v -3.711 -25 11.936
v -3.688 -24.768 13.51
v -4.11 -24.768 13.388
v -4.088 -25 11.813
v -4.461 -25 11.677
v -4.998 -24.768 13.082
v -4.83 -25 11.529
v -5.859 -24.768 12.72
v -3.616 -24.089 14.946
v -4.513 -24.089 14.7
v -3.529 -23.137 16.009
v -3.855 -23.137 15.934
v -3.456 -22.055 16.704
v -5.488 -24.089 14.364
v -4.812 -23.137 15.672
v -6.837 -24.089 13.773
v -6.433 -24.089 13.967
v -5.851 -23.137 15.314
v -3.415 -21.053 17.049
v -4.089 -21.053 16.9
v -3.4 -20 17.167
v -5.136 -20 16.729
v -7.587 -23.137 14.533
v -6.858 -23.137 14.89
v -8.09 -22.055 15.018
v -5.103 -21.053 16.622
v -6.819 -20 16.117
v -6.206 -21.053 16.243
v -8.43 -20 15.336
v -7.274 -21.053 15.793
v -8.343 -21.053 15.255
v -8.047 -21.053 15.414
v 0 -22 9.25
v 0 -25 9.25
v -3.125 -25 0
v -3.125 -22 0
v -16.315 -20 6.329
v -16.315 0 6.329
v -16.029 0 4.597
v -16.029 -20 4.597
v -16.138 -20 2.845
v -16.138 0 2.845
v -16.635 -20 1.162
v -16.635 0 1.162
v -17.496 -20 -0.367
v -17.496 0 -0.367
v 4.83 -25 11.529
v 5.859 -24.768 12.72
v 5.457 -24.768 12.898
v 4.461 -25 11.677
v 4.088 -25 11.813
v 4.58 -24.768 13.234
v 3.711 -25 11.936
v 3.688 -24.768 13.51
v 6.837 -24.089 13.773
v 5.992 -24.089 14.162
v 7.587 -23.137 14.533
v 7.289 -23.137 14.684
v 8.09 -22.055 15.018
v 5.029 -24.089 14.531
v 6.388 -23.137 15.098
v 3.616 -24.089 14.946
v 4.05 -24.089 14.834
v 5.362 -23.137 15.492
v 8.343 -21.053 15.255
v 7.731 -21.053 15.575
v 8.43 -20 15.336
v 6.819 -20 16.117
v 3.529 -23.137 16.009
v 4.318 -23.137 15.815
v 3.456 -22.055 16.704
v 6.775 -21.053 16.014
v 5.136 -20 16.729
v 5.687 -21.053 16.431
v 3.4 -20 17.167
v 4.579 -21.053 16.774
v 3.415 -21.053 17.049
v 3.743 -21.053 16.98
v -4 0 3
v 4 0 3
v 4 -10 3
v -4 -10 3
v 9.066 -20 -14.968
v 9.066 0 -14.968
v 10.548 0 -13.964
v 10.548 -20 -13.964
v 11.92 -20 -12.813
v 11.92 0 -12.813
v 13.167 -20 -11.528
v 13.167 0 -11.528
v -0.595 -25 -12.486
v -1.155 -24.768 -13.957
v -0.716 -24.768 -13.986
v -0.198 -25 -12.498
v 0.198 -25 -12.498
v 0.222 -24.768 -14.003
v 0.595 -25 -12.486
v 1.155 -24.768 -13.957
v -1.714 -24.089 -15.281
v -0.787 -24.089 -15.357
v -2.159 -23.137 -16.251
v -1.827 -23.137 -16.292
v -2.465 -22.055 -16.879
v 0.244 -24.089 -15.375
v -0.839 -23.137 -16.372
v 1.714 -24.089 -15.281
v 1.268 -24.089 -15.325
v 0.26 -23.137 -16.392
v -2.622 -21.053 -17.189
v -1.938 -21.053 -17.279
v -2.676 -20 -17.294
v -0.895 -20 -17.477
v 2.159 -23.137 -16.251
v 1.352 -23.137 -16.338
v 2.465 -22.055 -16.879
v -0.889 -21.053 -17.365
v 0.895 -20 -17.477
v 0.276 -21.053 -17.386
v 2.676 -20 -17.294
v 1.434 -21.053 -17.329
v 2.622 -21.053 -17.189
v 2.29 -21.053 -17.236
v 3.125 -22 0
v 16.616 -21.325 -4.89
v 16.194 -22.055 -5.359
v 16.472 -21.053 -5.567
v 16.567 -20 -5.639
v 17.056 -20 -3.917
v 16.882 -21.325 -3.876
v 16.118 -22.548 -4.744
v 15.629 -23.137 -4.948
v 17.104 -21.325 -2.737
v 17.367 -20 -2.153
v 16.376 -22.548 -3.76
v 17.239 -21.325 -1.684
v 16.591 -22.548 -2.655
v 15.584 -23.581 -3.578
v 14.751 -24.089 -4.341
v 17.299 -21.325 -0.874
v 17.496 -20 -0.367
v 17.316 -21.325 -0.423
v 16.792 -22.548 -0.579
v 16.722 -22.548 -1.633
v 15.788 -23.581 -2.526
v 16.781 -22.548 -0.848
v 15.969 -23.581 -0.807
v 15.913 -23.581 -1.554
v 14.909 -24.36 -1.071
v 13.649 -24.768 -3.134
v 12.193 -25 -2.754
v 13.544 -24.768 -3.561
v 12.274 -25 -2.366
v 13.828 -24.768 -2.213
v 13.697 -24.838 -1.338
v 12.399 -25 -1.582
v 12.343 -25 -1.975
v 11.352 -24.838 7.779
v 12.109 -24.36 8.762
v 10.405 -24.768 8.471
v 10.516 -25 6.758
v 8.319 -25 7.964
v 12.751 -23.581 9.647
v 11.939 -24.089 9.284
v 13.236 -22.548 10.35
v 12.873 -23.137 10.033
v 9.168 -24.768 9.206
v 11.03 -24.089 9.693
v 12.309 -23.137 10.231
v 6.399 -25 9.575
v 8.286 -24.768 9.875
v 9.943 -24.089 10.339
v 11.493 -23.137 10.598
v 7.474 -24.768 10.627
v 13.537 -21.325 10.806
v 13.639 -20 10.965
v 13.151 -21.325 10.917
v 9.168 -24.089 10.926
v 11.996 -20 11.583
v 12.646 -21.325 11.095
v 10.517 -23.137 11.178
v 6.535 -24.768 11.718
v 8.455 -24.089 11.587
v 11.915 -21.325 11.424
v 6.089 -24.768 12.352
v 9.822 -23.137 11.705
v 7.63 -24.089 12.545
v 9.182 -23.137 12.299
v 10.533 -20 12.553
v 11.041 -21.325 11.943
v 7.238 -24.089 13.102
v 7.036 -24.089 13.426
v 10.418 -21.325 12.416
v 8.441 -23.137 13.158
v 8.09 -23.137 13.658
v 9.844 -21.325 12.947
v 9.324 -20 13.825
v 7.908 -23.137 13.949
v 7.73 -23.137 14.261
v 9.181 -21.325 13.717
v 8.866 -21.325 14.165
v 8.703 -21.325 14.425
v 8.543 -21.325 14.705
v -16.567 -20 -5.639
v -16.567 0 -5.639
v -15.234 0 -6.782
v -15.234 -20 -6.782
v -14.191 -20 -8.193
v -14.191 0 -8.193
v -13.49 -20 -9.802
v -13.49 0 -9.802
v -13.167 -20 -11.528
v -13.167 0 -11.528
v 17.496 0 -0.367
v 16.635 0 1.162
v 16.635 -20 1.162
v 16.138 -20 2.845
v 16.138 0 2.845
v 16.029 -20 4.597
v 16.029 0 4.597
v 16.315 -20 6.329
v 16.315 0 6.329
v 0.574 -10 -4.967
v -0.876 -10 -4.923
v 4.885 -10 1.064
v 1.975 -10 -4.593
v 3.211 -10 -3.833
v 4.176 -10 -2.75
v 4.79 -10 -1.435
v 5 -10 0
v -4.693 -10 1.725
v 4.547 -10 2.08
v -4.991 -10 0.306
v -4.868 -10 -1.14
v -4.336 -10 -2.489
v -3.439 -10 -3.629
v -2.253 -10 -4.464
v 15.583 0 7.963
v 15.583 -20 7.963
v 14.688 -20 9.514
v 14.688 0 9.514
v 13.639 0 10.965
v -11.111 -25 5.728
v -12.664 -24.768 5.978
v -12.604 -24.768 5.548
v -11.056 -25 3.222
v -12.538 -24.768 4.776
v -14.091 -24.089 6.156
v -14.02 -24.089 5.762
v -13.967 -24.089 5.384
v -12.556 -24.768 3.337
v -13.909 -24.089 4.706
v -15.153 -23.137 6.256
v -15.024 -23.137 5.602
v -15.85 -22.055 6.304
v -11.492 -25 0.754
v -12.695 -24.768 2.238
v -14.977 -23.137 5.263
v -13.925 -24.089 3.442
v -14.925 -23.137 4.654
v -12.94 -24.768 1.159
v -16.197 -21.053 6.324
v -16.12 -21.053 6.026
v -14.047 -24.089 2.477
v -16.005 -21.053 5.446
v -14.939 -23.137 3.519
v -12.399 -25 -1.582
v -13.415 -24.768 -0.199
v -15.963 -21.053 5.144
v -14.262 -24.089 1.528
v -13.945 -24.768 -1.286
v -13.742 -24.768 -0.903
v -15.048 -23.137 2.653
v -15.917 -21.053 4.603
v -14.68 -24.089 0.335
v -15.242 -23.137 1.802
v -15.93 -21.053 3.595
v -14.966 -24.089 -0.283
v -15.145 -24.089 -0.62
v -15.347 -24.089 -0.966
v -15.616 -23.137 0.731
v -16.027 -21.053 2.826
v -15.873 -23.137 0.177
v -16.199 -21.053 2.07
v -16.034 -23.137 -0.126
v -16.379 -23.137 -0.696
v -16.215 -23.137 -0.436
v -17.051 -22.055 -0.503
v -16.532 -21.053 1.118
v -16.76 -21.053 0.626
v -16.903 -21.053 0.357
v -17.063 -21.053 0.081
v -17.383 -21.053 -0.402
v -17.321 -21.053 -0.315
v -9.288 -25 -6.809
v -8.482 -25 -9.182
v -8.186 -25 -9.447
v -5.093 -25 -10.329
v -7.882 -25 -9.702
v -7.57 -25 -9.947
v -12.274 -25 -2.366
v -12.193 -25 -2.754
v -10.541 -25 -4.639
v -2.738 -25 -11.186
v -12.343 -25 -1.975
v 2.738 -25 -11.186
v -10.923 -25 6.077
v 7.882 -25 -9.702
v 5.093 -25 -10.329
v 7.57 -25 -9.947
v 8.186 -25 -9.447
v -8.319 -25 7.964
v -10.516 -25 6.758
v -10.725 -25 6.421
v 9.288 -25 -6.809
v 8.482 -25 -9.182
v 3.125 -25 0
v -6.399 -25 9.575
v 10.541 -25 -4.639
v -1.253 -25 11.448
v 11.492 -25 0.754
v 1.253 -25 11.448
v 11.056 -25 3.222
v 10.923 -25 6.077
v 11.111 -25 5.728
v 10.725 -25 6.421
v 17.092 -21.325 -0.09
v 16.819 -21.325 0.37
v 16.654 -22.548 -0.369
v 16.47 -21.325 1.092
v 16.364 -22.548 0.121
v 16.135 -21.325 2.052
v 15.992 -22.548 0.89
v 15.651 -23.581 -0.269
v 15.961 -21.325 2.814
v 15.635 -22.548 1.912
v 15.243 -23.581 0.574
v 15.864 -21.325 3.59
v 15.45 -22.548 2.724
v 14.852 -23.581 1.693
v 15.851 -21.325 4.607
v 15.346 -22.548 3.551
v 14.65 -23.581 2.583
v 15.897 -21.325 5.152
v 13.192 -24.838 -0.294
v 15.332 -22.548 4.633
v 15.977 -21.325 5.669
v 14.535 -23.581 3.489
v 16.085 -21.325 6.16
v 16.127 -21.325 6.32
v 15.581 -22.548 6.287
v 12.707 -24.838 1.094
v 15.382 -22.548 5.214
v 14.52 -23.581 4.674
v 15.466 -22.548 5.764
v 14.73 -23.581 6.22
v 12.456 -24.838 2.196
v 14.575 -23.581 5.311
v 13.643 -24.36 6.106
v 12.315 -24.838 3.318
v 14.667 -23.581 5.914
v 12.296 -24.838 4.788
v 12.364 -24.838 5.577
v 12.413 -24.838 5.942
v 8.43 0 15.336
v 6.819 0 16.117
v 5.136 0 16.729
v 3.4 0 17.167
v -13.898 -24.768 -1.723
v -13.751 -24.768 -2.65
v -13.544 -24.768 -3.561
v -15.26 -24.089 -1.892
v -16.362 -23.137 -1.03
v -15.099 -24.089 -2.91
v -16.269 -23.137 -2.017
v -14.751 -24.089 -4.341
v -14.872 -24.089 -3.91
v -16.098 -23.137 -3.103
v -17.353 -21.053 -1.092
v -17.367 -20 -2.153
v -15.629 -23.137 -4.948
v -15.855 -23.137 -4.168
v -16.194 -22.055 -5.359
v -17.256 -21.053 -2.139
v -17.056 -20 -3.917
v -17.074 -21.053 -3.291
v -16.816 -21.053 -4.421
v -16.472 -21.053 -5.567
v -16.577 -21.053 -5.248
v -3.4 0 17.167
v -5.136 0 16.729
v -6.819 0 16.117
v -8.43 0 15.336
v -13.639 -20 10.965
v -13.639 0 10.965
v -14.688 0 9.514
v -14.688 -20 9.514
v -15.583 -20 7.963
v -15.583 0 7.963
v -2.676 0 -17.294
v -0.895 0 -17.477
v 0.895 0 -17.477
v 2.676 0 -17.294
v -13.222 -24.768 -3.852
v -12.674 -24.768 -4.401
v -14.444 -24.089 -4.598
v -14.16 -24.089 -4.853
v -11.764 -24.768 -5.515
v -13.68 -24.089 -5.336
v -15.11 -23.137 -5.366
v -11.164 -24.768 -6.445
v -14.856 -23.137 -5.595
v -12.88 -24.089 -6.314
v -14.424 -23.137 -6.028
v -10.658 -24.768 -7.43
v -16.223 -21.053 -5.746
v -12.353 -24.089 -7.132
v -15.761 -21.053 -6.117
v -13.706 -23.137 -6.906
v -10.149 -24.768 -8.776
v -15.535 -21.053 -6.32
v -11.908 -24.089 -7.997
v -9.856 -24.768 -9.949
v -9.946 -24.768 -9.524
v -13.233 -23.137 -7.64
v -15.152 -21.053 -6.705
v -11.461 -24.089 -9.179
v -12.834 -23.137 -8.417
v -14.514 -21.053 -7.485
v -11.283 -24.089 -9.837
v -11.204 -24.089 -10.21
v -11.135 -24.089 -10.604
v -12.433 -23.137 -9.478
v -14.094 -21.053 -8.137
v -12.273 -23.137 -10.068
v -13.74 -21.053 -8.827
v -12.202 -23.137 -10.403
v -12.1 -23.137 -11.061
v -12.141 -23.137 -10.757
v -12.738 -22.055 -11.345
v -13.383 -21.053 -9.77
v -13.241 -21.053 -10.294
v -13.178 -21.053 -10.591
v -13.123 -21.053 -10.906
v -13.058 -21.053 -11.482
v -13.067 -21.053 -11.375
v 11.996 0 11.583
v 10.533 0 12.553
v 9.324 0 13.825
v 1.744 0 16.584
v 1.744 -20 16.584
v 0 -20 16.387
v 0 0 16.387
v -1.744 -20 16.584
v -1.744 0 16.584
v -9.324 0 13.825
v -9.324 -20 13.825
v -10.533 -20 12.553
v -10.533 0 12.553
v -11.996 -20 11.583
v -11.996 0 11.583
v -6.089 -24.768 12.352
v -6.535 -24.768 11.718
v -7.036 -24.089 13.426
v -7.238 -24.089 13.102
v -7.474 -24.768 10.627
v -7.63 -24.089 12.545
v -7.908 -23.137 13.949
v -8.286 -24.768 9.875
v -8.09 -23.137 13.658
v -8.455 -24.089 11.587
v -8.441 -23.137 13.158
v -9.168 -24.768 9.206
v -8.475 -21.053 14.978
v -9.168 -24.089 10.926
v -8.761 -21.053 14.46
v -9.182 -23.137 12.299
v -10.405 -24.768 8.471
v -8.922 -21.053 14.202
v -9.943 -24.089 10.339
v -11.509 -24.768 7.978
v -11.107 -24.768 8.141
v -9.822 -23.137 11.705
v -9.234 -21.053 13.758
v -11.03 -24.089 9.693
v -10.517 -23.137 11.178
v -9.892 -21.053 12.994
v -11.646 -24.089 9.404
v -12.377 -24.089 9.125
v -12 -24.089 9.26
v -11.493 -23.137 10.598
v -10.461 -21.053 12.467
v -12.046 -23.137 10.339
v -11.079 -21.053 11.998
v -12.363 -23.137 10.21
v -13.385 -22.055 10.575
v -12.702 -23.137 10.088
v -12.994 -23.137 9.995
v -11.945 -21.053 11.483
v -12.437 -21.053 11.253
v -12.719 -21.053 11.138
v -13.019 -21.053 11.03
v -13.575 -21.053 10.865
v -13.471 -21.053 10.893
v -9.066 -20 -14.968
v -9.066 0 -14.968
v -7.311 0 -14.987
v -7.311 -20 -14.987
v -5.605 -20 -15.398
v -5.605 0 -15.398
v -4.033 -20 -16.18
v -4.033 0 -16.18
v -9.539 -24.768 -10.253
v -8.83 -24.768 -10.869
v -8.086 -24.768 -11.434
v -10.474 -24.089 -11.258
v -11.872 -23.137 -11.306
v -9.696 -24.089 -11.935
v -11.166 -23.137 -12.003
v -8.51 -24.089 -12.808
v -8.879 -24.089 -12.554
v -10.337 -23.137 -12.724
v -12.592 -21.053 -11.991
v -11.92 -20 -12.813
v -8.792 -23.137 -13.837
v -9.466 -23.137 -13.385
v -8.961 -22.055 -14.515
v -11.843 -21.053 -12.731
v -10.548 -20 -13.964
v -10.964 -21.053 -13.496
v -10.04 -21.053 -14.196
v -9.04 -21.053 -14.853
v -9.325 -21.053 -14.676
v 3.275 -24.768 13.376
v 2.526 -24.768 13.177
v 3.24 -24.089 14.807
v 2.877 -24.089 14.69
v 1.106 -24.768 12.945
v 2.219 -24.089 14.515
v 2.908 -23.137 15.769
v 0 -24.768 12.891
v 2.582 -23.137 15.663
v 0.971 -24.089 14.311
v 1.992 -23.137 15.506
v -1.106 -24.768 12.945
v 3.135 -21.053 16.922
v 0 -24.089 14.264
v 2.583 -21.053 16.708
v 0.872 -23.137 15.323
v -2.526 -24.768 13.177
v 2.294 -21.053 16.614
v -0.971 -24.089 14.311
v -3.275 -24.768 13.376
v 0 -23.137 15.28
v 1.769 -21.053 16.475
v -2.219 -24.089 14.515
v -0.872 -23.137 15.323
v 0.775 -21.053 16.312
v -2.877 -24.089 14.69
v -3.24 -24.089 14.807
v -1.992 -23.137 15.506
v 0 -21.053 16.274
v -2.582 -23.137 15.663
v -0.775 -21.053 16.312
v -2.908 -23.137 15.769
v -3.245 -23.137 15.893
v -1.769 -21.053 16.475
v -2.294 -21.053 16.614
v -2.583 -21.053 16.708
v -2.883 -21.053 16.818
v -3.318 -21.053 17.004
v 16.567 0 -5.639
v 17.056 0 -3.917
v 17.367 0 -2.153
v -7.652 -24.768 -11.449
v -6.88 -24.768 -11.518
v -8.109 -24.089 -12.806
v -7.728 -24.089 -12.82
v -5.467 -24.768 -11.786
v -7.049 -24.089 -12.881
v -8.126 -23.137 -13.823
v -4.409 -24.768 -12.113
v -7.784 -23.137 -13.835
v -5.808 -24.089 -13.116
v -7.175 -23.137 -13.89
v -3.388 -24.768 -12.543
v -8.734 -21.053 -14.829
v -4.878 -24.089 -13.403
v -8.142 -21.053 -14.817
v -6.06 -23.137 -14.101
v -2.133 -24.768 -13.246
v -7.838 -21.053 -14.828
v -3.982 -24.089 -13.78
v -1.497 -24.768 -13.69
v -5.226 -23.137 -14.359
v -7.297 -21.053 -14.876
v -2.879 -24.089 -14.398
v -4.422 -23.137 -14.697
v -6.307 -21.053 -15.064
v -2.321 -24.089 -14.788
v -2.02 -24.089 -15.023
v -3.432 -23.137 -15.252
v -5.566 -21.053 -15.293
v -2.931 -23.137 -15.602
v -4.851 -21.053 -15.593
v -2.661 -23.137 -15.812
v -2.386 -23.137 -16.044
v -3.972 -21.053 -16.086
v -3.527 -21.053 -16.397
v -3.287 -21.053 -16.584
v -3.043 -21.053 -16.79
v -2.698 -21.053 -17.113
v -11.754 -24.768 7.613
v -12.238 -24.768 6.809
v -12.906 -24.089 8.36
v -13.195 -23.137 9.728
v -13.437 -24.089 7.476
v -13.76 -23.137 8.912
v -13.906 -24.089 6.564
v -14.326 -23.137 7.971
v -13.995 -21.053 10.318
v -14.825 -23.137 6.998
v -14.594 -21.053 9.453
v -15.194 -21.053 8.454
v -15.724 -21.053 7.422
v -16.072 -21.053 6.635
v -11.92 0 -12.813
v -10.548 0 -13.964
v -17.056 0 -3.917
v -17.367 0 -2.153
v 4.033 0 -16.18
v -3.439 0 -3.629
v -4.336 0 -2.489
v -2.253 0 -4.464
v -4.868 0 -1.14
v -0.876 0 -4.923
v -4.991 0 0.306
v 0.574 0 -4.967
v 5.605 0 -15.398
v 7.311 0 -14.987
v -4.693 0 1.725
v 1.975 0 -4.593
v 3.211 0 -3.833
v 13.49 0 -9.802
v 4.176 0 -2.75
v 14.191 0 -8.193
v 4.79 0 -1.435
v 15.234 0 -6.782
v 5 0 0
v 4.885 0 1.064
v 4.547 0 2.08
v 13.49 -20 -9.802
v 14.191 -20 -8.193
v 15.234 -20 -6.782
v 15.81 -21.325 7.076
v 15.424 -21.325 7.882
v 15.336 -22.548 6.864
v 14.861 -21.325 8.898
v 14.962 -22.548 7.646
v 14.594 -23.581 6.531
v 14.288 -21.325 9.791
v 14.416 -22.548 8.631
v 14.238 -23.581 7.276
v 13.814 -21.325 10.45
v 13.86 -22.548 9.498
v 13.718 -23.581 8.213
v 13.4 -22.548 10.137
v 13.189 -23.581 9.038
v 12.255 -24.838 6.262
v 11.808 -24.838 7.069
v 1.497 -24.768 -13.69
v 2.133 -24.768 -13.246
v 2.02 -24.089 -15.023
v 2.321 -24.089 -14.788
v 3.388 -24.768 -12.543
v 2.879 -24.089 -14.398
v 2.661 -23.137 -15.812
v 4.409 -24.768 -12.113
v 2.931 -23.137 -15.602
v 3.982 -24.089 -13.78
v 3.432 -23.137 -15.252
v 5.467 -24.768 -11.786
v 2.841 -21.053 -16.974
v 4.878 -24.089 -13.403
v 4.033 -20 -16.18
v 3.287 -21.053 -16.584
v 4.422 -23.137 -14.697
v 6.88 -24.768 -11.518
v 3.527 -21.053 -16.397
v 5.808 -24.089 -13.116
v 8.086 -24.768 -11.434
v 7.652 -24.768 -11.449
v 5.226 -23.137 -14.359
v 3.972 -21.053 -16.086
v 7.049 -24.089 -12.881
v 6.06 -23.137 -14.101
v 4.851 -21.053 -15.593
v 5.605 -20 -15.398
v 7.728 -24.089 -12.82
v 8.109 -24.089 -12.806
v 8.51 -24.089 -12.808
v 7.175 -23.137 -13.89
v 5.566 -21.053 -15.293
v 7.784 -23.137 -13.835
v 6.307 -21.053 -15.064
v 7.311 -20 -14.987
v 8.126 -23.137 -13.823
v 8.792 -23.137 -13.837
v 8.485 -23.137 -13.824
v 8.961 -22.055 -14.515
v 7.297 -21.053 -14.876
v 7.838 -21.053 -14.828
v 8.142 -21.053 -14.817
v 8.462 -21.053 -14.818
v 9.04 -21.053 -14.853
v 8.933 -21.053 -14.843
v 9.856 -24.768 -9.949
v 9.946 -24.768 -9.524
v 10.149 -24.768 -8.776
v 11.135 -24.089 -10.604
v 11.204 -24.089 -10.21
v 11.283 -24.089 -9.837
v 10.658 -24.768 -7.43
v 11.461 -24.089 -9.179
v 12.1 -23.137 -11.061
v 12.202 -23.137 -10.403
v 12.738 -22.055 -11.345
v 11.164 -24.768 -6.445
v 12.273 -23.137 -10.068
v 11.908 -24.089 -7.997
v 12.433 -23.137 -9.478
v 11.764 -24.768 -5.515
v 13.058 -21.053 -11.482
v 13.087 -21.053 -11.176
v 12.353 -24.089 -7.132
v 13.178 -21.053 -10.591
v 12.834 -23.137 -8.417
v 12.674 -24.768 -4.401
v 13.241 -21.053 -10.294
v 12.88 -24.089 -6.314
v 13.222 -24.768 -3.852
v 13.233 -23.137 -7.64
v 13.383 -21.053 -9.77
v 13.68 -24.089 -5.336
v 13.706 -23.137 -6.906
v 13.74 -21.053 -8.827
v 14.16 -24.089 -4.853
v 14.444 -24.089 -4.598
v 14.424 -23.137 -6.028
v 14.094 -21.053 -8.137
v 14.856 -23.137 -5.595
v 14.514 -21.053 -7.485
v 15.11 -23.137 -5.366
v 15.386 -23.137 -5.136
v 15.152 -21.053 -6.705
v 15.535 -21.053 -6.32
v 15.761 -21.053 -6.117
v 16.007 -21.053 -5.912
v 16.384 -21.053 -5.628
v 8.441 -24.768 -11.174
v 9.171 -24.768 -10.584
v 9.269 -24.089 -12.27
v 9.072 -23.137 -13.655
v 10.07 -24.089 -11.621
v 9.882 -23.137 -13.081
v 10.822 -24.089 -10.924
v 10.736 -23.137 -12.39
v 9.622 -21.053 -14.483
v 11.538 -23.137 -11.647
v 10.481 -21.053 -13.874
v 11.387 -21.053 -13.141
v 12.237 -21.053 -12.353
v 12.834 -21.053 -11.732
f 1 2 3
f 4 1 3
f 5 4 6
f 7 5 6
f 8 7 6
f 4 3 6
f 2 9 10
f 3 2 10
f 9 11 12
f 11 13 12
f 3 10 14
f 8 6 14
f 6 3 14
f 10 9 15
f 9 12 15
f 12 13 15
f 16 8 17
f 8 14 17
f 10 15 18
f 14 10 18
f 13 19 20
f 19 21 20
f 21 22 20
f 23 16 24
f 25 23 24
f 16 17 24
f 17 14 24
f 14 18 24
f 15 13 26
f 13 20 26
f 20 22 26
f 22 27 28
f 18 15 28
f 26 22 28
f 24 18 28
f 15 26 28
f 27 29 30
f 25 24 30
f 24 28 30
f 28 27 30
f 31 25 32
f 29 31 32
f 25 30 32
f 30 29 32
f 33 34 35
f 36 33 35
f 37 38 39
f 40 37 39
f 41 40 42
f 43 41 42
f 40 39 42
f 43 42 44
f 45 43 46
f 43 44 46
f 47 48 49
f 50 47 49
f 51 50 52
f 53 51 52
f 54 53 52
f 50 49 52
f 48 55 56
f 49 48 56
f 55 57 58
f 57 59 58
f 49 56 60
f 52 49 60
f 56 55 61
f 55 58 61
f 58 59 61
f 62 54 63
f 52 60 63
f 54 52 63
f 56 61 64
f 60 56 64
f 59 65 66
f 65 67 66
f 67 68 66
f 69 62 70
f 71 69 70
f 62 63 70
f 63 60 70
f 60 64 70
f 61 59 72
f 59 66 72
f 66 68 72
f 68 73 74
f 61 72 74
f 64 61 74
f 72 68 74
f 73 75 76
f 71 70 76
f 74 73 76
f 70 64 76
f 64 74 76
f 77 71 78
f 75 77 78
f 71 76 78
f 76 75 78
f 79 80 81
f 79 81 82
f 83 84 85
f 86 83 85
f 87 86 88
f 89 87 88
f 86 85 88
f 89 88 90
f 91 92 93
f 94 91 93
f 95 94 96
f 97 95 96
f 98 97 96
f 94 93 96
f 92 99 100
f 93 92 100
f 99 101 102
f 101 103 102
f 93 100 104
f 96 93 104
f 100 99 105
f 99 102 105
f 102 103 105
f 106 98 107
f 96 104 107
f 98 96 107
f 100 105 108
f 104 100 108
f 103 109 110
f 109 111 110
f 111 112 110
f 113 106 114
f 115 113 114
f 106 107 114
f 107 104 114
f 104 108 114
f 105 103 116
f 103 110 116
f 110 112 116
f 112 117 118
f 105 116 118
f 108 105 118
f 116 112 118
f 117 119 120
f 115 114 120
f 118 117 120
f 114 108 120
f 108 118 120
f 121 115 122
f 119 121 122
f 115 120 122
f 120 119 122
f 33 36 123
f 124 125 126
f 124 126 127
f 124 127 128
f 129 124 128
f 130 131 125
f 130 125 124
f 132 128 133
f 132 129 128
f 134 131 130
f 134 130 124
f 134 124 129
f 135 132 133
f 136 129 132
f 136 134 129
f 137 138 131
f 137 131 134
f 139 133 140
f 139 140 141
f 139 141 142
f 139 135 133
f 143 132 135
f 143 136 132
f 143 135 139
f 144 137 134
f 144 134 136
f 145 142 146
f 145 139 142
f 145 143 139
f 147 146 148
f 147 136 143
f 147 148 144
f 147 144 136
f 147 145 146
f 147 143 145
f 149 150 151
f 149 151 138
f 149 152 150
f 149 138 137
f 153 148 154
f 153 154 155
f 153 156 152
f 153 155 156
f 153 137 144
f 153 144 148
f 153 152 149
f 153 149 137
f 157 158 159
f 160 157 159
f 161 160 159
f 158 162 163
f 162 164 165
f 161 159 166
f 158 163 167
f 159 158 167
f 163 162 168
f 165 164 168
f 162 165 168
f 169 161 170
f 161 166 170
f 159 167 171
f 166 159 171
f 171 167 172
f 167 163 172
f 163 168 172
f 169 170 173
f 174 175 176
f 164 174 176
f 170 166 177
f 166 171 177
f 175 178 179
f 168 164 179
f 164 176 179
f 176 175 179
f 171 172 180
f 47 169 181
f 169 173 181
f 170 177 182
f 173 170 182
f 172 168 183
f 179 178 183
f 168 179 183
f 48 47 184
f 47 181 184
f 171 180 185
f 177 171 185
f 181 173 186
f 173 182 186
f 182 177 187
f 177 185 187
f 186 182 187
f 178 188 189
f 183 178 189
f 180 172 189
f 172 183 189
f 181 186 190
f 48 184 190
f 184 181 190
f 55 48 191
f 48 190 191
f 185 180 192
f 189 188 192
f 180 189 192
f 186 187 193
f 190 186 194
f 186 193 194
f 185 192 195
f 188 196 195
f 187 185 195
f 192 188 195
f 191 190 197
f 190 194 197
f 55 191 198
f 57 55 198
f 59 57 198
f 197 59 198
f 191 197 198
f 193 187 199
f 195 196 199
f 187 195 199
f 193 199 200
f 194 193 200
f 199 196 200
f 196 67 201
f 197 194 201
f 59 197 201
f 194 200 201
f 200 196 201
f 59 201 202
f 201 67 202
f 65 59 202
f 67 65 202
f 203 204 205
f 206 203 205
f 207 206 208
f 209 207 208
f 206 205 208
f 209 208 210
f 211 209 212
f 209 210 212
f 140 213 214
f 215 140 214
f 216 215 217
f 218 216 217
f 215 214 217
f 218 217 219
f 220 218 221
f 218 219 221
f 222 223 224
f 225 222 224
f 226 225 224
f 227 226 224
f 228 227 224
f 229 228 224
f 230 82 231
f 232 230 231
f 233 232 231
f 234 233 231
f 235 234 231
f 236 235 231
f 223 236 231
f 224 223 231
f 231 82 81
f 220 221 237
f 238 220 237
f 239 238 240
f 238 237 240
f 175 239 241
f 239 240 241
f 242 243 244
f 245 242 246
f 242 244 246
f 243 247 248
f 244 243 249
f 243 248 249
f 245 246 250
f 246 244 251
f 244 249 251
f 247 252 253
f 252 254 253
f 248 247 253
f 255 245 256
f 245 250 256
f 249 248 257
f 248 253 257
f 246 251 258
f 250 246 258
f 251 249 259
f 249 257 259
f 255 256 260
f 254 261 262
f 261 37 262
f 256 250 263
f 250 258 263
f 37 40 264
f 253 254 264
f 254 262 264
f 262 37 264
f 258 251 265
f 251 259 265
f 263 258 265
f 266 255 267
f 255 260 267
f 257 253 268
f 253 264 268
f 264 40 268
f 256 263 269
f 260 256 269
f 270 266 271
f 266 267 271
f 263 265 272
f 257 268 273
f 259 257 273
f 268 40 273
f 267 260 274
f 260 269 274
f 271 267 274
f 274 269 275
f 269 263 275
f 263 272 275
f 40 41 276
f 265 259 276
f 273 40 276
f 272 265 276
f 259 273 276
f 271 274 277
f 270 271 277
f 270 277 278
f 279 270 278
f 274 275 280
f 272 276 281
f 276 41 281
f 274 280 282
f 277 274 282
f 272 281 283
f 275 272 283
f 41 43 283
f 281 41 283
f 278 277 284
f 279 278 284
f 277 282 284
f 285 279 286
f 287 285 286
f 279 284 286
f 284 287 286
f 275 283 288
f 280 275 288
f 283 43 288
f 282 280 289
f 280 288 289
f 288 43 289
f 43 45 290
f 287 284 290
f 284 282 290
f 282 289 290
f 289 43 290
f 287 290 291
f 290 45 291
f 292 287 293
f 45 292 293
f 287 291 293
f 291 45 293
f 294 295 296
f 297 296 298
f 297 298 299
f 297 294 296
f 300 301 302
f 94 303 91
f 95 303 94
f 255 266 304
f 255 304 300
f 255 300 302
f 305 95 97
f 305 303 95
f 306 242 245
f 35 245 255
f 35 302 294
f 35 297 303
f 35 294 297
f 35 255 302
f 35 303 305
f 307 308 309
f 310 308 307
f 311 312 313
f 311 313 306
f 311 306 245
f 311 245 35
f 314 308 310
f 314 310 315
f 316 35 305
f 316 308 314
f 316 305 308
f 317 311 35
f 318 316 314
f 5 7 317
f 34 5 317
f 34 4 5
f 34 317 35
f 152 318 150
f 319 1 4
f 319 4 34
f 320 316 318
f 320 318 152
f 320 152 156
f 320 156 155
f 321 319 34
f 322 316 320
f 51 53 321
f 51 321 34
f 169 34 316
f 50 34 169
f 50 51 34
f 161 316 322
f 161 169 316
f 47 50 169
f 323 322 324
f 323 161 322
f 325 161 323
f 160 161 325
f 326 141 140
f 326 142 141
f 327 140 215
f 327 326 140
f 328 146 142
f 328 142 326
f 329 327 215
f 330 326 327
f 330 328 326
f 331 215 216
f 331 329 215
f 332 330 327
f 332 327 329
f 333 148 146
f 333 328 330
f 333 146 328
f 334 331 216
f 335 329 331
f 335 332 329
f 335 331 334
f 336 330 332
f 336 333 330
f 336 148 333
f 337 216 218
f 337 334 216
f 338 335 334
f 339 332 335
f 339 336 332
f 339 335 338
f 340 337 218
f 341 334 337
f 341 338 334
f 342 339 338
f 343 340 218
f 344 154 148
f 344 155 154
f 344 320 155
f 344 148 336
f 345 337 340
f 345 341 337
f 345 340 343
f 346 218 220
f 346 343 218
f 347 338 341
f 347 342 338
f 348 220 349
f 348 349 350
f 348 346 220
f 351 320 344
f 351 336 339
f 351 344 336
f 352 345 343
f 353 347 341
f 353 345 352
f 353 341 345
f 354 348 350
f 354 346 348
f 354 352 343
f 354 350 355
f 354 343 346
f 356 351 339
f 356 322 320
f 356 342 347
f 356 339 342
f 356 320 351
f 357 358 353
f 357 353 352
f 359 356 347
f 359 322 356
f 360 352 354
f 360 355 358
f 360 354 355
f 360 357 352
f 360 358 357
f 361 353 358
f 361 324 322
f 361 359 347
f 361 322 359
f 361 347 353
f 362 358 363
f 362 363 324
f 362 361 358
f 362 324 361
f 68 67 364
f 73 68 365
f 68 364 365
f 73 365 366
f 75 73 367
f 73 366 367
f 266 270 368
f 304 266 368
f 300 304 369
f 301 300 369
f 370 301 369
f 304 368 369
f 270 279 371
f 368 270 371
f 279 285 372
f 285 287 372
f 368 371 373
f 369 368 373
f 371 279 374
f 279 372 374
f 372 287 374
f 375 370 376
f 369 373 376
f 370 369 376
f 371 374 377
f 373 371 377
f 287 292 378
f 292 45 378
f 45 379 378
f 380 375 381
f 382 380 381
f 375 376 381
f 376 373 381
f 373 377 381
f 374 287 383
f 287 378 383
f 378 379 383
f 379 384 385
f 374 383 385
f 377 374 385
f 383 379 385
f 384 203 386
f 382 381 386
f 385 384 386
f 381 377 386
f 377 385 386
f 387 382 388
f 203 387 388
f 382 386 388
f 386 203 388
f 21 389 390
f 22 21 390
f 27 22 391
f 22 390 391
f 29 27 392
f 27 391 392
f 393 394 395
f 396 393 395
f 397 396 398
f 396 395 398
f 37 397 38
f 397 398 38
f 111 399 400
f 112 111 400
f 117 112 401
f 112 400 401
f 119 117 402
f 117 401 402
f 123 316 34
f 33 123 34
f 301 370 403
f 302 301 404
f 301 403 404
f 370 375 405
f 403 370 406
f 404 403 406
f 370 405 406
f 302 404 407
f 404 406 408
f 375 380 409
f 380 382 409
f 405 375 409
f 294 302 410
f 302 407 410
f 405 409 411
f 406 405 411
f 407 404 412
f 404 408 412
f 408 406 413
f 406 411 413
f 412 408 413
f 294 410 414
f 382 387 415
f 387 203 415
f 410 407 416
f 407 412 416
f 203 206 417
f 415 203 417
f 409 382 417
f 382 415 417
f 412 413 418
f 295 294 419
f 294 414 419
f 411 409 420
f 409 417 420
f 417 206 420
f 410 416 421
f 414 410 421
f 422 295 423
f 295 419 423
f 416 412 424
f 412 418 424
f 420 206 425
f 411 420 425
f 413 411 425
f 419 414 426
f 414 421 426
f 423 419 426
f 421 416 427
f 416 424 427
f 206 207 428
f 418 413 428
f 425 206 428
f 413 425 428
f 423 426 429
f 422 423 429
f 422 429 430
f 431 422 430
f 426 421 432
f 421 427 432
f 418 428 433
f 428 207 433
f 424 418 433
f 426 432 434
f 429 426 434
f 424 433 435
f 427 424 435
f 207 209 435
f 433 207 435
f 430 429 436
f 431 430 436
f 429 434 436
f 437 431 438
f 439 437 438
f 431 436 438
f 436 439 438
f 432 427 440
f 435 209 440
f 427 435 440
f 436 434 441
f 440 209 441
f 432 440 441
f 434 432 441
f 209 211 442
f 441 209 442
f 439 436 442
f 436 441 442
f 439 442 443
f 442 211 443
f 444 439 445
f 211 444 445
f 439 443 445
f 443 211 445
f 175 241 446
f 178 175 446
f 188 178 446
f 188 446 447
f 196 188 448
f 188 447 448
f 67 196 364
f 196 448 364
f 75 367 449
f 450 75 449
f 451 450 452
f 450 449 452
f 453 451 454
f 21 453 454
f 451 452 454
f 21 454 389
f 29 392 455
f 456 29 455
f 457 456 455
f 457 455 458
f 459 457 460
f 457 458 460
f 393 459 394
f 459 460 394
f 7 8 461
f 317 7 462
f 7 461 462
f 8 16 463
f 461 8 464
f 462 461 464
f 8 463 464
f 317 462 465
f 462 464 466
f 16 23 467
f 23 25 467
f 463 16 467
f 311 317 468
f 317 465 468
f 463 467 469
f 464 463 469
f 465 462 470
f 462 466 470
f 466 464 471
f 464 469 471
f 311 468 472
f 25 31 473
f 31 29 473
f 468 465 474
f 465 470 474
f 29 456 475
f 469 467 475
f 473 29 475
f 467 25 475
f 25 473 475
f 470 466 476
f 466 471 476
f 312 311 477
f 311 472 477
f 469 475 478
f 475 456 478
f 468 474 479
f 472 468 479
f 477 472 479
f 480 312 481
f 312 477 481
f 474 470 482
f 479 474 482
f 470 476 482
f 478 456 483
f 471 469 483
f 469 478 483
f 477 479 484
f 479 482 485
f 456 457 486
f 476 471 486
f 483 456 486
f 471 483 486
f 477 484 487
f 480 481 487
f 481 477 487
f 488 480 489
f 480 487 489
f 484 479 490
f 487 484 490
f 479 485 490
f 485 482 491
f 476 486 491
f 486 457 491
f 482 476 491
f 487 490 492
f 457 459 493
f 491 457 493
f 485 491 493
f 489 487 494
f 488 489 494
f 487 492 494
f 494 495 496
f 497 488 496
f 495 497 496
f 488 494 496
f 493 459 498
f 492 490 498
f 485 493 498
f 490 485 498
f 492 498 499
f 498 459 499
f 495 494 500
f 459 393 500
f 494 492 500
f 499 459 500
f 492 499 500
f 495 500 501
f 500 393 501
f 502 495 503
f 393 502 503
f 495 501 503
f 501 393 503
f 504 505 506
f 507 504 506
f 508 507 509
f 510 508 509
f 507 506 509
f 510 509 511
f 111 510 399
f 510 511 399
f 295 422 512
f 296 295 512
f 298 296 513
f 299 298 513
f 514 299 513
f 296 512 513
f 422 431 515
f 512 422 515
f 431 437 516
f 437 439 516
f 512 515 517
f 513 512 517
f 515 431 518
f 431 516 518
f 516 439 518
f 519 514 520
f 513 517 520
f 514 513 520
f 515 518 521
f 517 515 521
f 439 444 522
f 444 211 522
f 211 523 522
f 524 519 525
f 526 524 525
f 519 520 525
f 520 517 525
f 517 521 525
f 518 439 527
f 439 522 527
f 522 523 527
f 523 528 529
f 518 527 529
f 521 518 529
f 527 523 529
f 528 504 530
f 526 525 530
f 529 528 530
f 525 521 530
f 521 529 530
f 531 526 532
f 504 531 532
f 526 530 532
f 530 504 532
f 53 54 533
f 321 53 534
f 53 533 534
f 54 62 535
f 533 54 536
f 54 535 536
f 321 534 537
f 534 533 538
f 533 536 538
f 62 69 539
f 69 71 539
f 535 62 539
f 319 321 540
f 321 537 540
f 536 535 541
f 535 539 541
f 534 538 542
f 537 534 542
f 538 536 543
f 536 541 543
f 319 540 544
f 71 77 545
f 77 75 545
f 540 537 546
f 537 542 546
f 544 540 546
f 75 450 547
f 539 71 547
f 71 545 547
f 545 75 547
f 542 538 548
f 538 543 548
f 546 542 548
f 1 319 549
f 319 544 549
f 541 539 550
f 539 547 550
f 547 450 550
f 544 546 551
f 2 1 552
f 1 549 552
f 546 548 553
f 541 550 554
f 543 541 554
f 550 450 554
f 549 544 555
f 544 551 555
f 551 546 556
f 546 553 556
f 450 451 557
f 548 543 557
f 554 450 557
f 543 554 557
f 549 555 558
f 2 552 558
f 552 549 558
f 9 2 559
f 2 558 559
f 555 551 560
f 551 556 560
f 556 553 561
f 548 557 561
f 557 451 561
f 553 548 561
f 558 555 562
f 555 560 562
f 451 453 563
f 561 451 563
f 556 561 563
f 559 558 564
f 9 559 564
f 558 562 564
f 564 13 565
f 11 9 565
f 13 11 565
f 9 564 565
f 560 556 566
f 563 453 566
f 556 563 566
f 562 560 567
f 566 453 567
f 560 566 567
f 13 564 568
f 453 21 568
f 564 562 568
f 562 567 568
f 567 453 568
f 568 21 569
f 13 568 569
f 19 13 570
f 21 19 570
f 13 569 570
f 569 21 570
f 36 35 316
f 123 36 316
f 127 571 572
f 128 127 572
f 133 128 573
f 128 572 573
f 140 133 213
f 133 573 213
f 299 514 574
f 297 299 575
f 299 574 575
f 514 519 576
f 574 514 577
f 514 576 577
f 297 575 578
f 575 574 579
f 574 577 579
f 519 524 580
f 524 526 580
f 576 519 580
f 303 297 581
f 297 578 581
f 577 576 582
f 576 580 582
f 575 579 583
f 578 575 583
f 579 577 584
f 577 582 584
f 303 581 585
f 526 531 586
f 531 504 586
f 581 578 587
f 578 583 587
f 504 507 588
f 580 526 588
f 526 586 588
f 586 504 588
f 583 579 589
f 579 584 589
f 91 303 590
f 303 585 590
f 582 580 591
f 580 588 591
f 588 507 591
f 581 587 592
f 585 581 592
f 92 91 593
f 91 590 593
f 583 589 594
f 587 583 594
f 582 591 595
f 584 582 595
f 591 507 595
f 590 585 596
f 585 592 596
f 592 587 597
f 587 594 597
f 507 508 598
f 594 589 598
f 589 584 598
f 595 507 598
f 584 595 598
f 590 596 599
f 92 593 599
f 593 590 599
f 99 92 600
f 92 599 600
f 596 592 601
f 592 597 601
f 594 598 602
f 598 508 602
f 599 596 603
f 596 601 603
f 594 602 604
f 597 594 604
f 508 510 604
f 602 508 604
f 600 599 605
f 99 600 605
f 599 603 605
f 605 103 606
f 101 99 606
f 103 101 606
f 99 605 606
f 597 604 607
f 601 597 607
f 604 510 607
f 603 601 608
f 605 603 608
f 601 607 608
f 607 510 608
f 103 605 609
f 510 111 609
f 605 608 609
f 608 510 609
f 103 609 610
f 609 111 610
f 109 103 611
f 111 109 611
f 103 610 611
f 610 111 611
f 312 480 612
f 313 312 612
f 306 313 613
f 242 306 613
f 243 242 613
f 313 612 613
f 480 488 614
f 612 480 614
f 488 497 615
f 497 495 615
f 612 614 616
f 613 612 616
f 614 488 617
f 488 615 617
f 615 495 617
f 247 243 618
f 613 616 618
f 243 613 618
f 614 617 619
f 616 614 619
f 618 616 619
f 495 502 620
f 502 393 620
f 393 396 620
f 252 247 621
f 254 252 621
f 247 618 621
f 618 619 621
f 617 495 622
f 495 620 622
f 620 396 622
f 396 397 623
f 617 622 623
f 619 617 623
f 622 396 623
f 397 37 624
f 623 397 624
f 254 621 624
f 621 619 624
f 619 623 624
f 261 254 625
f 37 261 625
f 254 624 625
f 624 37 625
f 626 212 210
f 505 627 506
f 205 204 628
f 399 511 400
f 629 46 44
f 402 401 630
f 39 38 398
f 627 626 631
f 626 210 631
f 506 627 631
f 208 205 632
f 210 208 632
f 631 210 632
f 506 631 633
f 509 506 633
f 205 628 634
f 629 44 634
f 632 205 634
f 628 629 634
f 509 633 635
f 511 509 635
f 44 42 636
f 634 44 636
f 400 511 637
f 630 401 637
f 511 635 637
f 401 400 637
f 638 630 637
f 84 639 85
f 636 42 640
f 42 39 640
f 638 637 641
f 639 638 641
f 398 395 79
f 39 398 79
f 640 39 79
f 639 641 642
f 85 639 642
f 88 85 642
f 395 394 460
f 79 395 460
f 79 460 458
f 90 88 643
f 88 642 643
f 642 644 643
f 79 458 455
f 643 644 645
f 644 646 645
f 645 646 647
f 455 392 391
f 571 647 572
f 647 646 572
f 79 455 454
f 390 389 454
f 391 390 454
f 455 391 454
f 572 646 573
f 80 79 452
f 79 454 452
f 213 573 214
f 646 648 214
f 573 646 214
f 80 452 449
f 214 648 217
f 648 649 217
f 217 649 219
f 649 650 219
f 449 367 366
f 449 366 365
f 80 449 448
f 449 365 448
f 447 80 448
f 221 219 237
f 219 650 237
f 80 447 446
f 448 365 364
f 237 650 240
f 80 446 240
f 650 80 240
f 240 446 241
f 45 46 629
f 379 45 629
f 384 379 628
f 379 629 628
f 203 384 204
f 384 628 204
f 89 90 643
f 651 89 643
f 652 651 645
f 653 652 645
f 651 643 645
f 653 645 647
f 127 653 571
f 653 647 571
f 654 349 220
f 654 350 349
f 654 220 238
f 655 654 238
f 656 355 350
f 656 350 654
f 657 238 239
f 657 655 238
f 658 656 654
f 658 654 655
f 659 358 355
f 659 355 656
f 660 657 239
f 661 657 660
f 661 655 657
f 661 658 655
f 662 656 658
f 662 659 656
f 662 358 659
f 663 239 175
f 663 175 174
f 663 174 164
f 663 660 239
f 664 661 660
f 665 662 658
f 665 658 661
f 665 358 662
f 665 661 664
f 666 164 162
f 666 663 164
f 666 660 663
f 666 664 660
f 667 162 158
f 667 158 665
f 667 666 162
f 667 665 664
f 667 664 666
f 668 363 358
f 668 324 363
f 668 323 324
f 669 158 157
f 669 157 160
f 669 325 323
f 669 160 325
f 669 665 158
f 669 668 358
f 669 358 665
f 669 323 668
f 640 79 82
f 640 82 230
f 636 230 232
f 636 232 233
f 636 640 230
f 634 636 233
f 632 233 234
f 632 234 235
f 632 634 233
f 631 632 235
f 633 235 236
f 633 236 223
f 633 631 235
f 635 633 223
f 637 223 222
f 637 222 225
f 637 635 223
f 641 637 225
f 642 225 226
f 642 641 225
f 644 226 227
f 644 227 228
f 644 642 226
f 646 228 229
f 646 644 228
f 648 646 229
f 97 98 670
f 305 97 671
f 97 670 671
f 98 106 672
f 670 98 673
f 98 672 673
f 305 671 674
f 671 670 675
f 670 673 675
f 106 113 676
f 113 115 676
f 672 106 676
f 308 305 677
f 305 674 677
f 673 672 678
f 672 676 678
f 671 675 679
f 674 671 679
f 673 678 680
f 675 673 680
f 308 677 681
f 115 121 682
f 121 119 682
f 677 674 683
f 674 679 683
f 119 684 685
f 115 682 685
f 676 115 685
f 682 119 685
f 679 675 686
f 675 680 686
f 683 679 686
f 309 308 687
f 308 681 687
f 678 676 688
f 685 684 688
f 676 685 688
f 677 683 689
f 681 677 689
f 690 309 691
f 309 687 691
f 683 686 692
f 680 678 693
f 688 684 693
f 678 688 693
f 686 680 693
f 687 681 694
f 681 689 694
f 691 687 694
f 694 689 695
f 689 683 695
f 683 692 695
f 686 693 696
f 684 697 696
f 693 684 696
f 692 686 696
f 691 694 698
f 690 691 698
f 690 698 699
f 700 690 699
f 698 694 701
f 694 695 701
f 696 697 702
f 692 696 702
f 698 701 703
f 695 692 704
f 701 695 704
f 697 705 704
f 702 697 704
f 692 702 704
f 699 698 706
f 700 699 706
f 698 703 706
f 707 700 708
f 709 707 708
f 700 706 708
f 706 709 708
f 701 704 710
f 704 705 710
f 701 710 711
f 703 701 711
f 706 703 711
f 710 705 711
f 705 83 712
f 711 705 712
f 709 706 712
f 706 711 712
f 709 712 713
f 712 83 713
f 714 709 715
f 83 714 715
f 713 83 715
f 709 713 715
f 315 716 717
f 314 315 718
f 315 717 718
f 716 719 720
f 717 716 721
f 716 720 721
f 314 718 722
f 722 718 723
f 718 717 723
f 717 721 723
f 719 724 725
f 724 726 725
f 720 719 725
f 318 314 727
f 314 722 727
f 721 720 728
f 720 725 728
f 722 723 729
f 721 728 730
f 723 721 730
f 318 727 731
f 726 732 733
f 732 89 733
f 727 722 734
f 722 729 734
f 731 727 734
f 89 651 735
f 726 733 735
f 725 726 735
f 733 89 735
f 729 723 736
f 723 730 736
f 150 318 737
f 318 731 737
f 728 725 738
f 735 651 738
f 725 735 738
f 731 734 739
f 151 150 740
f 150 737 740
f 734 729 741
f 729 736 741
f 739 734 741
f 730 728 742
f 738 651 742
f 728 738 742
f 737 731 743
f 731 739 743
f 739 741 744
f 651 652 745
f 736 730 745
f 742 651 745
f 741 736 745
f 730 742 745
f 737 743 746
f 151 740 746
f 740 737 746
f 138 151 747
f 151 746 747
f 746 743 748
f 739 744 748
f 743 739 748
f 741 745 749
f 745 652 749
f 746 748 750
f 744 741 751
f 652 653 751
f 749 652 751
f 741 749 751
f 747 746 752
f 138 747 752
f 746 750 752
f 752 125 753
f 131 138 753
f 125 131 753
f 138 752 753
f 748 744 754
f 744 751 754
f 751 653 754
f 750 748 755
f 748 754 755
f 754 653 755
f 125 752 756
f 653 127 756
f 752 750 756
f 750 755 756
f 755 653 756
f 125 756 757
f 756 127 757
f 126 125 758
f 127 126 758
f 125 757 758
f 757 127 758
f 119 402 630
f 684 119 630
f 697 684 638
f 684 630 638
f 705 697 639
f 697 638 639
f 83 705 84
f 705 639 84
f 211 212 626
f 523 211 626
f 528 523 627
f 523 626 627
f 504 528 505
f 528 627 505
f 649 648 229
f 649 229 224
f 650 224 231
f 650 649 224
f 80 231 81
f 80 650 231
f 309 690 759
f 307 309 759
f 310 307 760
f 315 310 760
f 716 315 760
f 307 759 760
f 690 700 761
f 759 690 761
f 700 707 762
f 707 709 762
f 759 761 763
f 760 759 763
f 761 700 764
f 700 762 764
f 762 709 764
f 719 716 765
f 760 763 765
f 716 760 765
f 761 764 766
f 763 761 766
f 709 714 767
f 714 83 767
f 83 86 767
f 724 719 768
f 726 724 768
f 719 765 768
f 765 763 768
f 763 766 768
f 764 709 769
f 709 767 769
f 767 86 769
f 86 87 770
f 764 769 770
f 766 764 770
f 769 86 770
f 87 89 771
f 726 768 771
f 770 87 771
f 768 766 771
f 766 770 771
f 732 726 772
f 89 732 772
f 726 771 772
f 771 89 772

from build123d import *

# Parameters (mm, degrees)
F1_DEPTH = 25
F2_DEPTH = 10
F3_R     = 5
F5_DEPTH = 3


with BuildPart() as f1:
    # F0 (on Front) → F1 (new body)
    with BuildSketch(Plane.XZ):
        with BuildLine():
            ThreePointArc((17.496143, -0.367408), (16.137561, 2.845487), (16.315335, 6.329284))
            ThreePointArc((16.315335, 6.329284), (15.155445, 8.75), (13.638989, 10.964853))
            ThreePointArc((13.638989, 10.964853), (10.533045, 12.552794), (8.429886, 15.335808))
            ThreePointArc((8.429886, 15.335808), (5.985353, 16.444621), (3.4, 17.166537))
            ThreePointArc((3.4, 17.166537), (0, 16.386509), (-3.4, 17.166537))
            ThreePointArc((-3.4, 17.166537), (-5.985353, 16.444621), (-8.429886, 15.335808))
            ThreePointArc((-8.429886, 15.335808), (-10.533045, 12.552794), (-13.638989, 10.964853))
            ThreePointArc((-13.638989, 10.964853), (-15.155445, 8.75), (-16.315335, 6.329284))
            ThreePointArc((-16.315335, 6.329284), (-16.137561, 2.845487), (-17.496143, -0.367408))
            ThreePointArc((-17.496143, -0.367408), (-17.234136, -3.038843), (-16.566657, -5.638782))
            ThreePointArc((-16.566657, -5.638782), (-14.191133, -8.193254), (-13.166657, -11.527755))
            ThreePointArc((-13.166657, -11.527755), (-11.248783, -13.405778), (-9.066256, -14.9684))
            ThreePointArc((-9.066256, -14.9684), (-5.604516, -15.398281), (-2.676347, -17.294137))
            ThreePointArc((-2.676347, -17.294137), (0, -17.5), (2.676347, -17.294137))
            ThreePointArc((2.676347, -17.294137), (5.604516, -15.398281), (9.066256, -14.9684))
            ThreePointArc((9.066256, -14.9684), (11.248783, -13.405778), (13.166657, -11.527755))
            ThreePointArc((13.166657, -11.527755), (14.191133, -8.193254), (16.566657, -5.638782))
            ThreePointArc((16.566657, -5.638782), (17.234136, -3.038843), (17.496143, -0.367408))
        make_face()
        with BuildLine():
            ThreePointArc((4, 3), (4.743416, 1.581139), (5, 0))
            ThreePointArc((5, 0), (-1.581139, -4.743416), (-4, 3))
            ThreePointArc((-4, 3), (0, 5), (4, 3))
        make_face(mode=Mode.SUBTRACT)
        with BuildLine():
            ThreePointArc((-4, 3), (-1.581139, -4.743416), (5, 0))
            ThreePointArc((5, 0), (4.743416, 1.581139), (4, 3))
            Line((4, 3), (-4, 3))
        make_face()
        with BuildLine():
            Line((-4, 3), (4, 3))
            ThreePointArc((4, 3), (0, 5), (-4, 3))
        make_face()
    extrude(amount=F1_DEPTH)

    # F0 (on Front) → F2 (cut)
    with BuildSketch(Plane.XZ):
        with BuildLine():
            ThreePointArc((-4, 3), (-1.581139, -4.743416), (5, 0))
            ThreePointArc((5, 0), (4.743416, 1.581139), (4, 3))
            Line((4, 3), (-4, 3))
        make_face()
    extrude(amount=F2_DEPTH, mode=Mode.SUBTRACT)

    # F3
    f3_edges = [f1.edges().sort_by_distance(p)[0] for p in [
        (16.137561, -25, 2.845487),
        (15.155445, -25, 8.75),
        (10.533045, -25, 12.552794),
        (5.985353, -25, 16.444621),
        (0, -25, 16.386509),
        (-5.985353, -25, 16.444621),
        (-10.533045, -25, 12.552794),
        (-15.155445, -25, 8.75),
        (-16.137561, -25, 2.845487),
        (-17.234136, -25, -3.038843),
        (-14.191133, -25, -8.193254),
        (-11.248783, -25, -13.405778),
        (-5.604516, -25, -15.398281),
        (0, -25, -17.5),
        (5.604516, -25, -15.398281),
        (11.248783, -25, -13.405778),
        (14.191133, -25, -8.193254),
        (17.234136, -25, -3.038843),
    ]]
    fillet(f3_edges, radius=F3_R)

    # F4 (on face) → F5 (cut)
    with BuildSketch(Plane.XZ.offset(25)):
        Polygon((-3.125, 0), (0, 0), (3.125, 0), (0, 9.25), align=None)
    extrude(amount=-F5_DEPTH, mode=Mode.SUBTRACT)


solid = f1.part
